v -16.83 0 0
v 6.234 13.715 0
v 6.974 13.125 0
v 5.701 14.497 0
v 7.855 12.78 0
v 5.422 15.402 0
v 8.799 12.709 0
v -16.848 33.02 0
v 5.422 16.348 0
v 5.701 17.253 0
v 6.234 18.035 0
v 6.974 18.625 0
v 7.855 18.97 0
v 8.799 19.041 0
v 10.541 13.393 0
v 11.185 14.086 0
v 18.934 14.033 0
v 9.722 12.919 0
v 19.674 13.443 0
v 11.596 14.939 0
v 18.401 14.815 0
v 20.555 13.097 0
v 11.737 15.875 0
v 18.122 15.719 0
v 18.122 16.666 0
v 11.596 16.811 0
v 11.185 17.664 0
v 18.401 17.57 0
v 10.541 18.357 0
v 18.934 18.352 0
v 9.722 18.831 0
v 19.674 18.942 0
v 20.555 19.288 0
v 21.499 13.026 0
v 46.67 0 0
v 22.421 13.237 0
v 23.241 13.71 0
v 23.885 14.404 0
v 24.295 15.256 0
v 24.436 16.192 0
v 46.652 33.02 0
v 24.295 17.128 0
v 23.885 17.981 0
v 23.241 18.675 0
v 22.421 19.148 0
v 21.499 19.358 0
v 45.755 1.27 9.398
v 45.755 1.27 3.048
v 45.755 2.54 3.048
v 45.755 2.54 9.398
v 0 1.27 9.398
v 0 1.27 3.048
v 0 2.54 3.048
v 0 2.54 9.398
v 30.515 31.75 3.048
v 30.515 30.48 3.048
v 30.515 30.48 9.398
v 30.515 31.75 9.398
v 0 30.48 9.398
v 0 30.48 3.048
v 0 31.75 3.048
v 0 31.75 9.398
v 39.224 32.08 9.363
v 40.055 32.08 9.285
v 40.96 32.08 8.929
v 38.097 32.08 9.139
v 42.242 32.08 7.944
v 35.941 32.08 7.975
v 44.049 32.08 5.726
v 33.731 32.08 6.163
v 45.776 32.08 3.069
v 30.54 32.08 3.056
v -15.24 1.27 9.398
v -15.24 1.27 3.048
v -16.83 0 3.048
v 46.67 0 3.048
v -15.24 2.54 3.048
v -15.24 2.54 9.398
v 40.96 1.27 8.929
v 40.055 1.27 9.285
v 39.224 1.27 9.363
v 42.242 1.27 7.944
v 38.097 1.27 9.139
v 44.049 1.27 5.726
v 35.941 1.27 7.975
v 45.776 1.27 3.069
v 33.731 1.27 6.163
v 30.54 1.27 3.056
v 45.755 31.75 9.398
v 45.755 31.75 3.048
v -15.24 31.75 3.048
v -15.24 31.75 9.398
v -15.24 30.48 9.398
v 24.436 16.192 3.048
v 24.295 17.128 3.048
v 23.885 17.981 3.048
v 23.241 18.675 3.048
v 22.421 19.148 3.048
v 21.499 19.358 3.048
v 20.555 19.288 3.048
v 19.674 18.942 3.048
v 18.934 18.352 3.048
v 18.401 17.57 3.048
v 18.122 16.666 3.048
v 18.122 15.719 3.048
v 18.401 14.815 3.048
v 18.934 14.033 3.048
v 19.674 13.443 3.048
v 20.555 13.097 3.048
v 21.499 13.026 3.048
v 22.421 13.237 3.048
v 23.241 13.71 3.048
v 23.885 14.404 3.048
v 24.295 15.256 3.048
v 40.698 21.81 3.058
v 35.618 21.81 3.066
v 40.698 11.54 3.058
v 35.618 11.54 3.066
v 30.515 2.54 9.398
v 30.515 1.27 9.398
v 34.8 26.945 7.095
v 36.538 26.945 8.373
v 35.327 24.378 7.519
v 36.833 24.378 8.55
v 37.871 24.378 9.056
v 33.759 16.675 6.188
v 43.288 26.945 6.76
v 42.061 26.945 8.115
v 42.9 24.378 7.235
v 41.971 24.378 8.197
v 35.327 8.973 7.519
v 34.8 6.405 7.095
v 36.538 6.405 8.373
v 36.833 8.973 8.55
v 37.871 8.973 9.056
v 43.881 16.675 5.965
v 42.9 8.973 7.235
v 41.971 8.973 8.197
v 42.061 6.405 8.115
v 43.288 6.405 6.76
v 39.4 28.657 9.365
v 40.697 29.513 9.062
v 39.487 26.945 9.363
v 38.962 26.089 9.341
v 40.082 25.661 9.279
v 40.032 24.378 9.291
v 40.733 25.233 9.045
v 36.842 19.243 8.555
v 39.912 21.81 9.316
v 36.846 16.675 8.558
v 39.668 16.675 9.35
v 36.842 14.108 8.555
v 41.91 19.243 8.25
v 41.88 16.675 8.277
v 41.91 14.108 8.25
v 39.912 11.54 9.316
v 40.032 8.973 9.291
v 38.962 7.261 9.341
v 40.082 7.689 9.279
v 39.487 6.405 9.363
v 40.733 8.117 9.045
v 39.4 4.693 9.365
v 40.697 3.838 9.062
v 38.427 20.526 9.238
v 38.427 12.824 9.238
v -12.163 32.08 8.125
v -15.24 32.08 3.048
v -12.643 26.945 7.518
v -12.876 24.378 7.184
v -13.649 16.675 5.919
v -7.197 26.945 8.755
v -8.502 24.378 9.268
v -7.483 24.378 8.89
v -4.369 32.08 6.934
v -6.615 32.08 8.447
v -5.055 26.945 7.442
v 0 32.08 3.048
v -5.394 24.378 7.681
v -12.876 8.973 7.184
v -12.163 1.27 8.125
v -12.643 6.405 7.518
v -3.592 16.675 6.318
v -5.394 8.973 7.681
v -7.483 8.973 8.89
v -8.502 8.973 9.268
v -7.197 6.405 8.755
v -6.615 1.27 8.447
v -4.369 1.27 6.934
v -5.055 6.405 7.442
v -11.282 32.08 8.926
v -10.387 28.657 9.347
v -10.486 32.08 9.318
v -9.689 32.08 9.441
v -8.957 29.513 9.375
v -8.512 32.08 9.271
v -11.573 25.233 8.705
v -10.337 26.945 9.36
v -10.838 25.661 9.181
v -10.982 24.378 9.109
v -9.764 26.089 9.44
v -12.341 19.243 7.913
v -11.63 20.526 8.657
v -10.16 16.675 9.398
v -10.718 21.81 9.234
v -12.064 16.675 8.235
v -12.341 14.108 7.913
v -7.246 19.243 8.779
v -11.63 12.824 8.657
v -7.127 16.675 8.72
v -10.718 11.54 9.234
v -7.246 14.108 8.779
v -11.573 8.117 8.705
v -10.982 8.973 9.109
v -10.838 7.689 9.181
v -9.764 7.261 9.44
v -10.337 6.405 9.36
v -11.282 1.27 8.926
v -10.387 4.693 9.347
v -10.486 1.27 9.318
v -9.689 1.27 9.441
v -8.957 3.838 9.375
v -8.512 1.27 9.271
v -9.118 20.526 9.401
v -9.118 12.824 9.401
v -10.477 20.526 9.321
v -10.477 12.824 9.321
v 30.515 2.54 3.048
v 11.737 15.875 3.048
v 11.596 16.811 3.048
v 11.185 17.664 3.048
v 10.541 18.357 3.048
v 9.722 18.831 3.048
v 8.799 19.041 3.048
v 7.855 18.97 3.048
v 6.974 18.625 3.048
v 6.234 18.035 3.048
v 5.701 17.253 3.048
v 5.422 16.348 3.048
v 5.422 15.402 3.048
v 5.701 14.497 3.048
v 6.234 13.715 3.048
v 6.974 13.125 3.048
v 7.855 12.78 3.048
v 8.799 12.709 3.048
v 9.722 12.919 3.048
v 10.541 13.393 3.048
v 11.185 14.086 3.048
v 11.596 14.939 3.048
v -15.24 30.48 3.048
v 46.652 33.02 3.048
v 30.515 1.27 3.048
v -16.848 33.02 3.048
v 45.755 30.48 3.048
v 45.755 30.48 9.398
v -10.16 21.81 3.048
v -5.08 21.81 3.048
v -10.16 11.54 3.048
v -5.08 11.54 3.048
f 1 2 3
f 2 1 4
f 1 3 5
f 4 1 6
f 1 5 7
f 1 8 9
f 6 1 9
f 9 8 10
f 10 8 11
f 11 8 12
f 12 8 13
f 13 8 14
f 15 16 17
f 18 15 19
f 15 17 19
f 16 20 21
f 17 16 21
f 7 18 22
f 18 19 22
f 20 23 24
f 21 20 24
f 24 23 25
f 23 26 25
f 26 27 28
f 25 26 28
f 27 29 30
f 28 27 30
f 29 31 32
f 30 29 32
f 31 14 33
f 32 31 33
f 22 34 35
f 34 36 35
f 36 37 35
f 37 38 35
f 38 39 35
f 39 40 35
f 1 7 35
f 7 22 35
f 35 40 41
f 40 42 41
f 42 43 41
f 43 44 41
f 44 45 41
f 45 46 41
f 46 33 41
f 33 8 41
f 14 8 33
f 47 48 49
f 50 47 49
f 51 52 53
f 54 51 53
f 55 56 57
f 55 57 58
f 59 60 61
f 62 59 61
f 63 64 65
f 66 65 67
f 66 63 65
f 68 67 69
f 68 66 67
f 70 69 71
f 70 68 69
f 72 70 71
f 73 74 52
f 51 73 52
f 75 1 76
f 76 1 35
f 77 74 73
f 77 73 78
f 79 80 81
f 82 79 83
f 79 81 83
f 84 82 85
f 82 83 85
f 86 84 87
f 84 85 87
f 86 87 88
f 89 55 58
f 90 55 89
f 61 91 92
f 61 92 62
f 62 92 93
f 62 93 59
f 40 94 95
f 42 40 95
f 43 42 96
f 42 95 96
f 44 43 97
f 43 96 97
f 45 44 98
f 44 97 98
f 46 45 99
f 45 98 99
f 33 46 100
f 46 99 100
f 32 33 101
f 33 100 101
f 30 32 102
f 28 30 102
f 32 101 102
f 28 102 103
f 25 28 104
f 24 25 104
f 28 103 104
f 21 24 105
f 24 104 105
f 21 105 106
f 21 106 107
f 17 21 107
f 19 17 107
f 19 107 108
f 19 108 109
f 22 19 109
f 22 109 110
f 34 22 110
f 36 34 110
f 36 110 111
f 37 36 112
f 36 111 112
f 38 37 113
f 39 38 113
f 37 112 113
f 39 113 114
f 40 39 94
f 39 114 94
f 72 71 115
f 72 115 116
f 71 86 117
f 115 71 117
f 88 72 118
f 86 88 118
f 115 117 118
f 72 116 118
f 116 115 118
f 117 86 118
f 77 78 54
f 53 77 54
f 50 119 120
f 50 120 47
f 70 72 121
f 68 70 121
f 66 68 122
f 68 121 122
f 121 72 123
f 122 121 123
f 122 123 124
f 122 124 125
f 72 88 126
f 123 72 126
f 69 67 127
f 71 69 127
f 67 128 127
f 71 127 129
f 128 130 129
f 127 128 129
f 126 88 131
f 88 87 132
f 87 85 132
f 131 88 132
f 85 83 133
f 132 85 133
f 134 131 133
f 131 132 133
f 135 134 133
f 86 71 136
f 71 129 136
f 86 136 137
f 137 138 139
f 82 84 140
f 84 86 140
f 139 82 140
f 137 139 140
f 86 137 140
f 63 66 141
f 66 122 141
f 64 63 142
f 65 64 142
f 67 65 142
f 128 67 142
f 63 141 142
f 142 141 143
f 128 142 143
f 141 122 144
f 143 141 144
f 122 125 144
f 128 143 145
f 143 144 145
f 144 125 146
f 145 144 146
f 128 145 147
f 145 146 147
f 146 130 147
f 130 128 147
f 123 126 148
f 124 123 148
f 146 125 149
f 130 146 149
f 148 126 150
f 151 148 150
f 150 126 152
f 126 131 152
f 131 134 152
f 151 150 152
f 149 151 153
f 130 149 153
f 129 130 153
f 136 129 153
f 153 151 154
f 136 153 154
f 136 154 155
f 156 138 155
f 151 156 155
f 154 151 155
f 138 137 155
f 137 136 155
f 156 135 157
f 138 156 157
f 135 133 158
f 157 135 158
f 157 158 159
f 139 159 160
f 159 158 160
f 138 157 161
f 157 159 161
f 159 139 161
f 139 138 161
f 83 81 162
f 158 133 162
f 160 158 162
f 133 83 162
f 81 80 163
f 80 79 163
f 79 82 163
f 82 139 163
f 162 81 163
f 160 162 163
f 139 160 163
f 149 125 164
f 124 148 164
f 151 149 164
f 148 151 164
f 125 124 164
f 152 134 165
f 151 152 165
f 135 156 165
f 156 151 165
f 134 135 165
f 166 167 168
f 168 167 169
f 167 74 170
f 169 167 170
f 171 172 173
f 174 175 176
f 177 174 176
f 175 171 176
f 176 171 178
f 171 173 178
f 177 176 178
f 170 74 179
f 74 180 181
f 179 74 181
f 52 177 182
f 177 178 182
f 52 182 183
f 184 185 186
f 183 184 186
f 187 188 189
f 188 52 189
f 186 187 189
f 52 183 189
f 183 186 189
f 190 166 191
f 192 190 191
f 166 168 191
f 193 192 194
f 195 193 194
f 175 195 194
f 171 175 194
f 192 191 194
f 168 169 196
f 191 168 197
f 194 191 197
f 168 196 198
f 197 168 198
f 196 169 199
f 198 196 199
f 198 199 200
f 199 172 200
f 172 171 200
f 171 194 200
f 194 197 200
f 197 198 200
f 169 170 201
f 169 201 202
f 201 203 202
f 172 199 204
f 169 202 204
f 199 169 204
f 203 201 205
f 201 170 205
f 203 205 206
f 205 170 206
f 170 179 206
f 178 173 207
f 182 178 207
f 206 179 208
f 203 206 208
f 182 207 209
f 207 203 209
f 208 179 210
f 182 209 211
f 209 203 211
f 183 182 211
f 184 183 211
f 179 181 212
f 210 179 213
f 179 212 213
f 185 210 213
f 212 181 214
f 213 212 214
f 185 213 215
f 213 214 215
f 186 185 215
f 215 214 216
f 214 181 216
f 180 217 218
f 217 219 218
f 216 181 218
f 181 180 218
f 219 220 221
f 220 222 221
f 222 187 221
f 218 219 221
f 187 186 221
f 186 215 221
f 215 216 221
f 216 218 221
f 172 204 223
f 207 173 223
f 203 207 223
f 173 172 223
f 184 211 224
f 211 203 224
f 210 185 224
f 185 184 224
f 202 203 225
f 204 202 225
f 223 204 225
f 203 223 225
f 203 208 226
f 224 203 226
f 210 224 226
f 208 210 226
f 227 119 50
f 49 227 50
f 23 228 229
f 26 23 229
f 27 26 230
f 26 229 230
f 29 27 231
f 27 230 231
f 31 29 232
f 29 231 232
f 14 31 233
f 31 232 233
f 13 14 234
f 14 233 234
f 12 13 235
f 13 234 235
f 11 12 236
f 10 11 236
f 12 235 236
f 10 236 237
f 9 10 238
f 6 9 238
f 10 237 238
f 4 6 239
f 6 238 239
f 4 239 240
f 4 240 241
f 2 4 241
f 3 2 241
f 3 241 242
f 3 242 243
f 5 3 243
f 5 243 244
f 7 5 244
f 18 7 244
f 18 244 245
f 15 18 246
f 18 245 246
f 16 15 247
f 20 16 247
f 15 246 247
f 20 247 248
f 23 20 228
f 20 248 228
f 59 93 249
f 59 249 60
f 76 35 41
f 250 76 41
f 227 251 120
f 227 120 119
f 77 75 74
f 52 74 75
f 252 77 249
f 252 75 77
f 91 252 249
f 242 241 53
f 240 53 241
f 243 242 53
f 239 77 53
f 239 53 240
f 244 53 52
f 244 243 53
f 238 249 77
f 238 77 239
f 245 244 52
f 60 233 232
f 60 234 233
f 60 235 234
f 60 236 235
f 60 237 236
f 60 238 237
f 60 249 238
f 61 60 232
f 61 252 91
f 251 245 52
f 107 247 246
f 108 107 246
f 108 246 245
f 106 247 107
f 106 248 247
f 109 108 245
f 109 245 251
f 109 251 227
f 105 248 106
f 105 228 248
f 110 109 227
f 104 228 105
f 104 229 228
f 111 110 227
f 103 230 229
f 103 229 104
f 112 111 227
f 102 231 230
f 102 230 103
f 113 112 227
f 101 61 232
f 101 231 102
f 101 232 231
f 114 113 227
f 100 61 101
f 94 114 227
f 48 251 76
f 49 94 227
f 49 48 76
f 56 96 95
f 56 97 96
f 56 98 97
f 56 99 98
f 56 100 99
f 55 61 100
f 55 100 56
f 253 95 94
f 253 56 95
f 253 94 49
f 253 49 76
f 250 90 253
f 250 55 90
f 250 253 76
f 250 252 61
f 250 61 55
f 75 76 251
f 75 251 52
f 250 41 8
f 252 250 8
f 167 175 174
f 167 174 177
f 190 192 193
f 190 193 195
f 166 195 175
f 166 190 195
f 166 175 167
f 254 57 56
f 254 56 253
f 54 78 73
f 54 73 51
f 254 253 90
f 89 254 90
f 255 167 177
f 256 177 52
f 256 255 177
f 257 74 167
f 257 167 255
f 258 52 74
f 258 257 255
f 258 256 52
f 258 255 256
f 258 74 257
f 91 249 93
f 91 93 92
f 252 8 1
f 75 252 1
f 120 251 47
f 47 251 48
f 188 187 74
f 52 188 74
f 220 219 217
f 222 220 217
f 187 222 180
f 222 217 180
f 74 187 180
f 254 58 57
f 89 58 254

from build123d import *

# Parameters (mm, degrees)
F1_DEPTH = 3.048
F2_R     = 3.175
F3_DEPTH = 3.048
F4_W     = 15.24
F4_H     = 30.48
F5_DEPTH = 6.35
F6_W     = 62.0194016004
F6_H     = 27.94
F7_DEPTH = 6.35
F9_DEPTH = 30.8102


with BuildPart() as f1:
    # F0 (on Top) → F1 (new body)
    with BuildSketch(Plane.XY):
        Polygon((-16.8479376035, 33.0199948793), (-16.8295481792, 0), (46.6704518208, 0), (46.6520623965, 33.0199948793), align=None)
    extrude(amount=F1_DEPTH)

    # F2 (on face) → F3 (cut, through all)
    with BuildSketch(Plane.XY.offset(3.048)):
        with Locations((8.561614689, 15.875)):
            Circle(F2_R)
        with Locations((21.2614300895, 16.1923207167)):
            Circle(F2_R)
    extrude(amount=-F3_DEPTH, mode=Mode.SUBTRACT)

    # F4 (on face) → F5 (join)
    with BuildSketch(Plane.XY.offset(3.048)):
        with Locations((-7.62, 16.51)):
            Rectangle(F4_W, F4_H)
        with Locations((38.1352330548, 16.51)):
            Rectangle(F4_W, F4_H)
    extrude(amount=F5_DEPTH)

    # F6 (on face) → F7 (cut)
    with BuildSketch(Plane.XY.offset(9.398)):
        with Locations((15.7697008002, 16.51)):
            Rectangle(F6_W, F6_H)
    extrude(amount=-F7_DEPTH, mode=Mode.SUBTRACT)


with BuildPart() as f9:
    # F8 (on face) → F9 (new body)
    with BuildSketch(Plane.XZ.offset(-1.27)):
        with BuildLine():
            add(Edge.make_bspline(
                [(-15.24, 3.048), (-13.5387080671, 5.996791801), (-10.8639642482, 12.670134119), (-3.4730522253, 6.4656238418), (0, 3.048)],
                knots=[0, 0, 0, 0, 0.4517094767, 1, 1, 1, 1], degree=3))
            add(Edge.make_bspline(
                [(-15.24, 3.048), (-10.16, 3.048), (-5.08, 3.048), (0, 3.048)],
                knots=[0, 0, 0, 0, 15.24, 15.24, 15.24, 15.24], degree=3))
        make_face()
    extrude(amount=-F9_DEPTH)


with BuildPart() as f9b:
    # F8 (on face) → F9, piece 2 (new body)
    with BuildSketch(Plane.XZ.offset(-1.27)):
        with BuildLine():
            add(Edge.make_bspline(
                [(30.540110527, 3.0558435246), (33.7793064673, 6.2974918435), (39.9064786558, 12.5691793586), (43.8985103843, 6.0406424941), (45.7755699754, 3.0687376857)],
                knots=[0, 0, 0, 0, 0.5294114363, 1, 1, 1, 1], degree=3))
            add(Edge.make_bspline(
                [(45.7755699754, 3.0687376857), (40.7000767688, 3.0370605332), (35.6156037336, 3.087520677), (30.540110527, 3.0558435246)],
                knots=[0, 0, 0, 0, 15.2354649047, 15.2354649047, 15.2354649047, 15.2354649047], degree=3))
        make_face()
    extrude(amount=-F9_DEPTH)


solid = Compound([f1.part, f9.part, f9b.part])
